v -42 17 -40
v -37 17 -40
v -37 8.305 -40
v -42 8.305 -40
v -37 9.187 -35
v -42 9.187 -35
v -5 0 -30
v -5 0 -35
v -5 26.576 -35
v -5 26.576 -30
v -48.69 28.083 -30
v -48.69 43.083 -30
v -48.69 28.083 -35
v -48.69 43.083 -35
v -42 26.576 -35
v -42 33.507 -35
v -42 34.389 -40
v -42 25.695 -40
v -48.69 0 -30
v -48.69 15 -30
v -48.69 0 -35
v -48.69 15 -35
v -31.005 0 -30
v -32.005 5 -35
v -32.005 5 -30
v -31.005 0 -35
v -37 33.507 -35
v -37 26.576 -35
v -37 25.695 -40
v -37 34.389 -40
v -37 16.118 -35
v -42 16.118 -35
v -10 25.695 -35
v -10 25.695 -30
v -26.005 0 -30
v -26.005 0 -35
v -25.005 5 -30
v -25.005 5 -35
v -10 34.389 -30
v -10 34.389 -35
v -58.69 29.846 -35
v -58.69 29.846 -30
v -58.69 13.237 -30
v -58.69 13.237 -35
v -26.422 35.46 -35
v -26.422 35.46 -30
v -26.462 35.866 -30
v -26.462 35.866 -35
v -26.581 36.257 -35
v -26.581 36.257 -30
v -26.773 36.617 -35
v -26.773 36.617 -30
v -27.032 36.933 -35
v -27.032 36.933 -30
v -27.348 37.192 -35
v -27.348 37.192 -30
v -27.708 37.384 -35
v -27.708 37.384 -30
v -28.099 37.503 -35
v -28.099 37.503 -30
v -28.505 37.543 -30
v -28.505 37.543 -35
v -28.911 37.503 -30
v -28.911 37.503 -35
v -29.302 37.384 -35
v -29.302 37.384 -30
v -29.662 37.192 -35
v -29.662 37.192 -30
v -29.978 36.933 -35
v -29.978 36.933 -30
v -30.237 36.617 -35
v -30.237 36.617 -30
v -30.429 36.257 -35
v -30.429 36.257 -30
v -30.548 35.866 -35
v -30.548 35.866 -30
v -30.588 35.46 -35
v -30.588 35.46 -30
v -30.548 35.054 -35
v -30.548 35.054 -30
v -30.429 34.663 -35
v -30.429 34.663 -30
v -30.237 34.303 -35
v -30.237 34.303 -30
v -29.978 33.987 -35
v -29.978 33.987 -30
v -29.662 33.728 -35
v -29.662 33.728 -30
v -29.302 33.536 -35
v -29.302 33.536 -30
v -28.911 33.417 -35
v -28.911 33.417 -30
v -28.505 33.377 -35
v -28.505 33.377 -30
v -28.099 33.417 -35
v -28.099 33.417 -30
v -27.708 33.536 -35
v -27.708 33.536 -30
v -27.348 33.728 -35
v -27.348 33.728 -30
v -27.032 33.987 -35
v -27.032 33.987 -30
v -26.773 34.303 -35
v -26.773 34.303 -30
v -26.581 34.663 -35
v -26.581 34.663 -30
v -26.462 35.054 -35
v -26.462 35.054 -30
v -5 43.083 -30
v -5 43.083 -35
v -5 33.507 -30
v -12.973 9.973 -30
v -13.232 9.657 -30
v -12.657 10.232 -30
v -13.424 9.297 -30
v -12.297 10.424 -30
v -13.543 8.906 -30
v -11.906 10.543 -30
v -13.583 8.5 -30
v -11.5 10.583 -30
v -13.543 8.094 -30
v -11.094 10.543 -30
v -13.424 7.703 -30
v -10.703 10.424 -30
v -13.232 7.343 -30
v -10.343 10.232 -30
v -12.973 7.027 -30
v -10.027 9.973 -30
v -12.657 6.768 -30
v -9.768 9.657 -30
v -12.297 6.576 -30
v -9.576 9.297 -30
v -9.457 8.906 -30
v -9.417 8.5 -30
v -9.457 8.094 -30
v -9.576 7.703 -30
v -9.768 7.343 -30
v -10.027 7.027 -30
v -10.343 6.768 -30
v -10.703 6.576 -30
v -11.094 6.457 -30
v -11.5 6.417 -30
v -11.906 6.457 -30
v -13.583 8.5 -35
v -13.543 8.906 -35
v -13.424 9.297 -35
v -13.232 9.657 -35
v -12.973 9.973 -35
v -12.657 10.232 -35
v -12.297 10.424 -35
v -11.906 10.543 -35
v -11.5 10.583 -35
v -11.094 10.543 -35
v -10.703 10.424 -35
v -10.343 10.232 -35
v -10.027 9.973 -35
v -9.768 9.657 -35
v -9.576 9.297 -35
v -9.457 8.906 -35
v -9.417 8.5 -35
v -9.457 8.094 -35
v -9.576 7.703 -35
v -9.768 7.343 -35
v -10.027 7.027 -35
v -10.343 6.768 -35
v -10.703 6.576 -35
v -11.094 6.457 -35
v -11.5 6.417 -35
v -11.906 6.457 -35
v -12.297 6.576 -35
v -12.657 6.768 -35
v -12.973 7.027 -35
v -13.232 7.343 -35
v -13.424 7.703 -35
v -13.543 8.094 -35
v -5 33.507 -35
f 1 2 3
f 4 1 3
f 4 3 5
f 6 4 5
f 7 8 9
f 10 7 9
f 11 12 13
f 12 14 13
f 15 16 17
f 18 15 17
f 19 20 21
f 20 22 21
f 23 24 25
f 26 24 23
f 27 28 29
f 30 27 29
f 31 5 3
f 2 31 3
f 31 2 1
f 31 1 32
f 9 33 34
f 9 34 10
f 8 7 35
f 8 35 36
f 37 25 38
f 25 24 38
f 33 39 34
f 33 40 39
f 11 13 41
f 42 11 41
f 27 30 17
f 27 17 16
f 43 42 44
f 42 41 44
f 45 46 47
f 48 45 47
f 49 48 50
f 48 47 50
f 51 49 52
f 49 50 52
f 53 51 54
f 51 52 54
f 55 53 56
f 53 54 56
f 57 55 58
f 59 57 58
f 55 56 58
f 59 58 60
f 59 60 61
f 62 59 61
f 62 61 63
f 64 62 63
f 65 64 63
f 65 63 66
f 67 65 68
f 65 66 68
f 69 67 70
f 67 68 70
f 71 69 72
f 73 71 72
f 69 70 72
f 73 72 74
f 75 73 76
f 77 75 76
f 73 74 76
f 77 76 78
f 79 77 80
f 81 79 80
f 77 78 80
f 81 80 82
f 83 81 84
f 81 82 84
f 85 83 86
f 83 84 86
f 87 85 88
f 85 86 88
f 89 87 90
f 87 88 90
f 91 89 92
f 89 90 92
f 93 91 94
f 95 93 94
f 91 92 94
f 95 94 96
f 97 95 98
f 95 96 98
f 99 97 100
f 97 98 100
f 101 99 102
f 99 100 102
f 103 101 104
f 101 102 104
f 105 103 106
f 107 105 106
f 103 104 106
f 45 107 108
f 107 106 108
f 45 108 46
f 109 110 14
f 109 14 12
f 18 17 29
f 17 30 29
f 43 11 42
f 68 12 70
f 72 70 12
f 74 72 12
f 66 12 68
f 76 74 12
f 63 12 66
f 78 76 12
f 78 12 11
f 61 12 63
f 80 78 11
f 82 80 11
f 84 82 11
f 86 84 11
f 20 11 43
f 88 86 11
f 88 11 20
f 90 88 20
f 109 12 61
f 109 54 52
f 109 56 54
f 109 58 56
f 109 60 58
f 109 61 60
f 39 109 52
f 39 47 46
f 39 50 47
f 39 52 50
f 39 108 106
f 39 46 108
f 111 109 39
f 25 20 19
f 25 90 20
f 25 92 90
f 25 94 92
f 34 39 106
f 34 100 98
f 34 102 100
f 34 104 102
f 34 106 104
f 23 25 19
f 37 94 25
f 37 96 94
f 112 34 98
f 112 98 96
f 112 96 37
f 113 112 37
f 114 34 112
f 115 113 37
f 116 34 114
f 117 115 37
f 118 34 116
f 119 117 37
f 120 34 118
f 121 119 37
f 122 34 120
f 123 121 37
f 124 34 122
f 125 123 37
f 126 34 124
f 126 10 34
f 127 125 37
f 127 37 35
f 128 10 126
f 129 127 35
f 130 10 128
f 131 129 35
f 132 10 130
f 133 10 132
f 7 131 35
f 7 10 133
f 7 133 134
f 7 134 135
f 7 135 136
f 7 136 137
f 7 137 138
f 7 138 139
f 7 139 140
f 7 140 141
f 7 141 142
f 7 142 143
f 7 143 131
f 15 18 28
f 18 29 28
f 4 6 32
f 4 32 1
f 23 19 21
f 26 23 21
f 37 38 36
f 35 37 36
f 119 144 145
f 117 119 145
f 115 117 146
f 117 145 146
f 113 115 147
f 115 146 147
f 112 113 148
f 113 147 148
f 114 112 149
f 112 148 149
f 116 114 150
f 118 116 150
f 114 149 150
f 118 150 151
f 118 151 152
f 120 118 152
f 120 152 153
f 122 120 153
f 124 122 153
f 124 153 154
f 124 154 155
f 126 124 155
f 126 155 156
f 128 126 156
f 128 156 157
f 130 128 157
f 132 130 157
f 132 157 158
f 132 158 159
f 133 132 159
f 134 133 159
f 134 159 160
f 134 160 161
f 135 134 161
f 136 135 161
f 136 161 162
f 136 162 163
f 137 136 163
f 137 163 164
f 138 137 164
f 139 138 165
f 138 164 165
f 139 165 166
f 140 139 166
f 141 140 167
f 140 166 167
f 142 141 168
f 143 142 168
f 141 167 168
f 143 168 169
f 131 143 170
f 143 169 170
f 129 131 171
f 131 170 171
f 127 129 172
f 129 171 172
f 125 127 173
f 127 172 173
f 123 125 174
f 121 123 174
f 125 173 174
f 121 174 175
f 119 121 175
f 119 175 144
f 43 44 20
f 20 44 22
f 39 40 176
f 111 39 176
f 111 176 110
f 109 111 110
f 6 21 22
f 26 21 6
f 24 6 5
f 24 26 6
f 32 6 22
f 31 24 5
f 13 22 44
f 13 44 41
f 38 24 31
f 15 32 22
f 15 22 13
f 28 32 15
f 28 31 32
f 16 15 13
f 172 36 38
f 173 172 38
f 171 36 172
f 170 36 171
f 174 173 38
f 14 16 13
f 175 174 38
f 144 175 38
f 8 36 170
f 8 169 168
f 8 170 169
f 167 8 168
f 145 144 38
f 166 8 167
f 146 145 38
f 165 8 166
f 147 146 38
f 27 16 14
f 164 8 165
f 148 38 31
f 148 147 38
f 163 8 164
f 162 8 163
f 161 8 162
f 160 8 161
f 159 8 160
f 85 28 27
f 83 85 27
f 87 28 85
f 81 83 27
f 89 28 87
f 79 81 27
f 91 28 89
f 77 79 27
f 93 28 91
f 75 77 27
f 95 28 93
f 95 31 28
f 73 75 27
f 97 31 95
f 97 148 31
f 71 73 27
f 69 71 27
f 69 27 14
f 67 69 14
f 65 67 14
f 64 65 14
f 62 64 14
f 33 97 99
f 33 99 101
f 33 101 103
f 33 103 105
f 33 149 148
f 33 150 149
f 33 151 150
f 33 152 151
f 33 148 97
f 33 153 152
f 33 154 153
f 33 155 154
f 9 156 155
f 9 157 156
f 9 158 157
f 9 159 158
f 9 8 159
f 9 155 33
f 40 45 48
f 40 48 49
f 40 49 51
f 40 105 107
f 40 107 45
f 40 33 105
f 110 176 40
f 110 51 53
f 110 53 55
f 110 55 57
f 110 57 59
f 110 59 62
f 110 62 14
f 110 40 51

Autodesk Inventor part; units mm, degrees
ref_plane "YZ Plane" through (0, 0, 0) normal (1, 0, 0) x (0, 1, 0)
ref_plane "XZ Plane" through (0, 0, 0) normal (0, 1, 0) x (-1, 0, 0)
ref_plane "XY Plane" through (0, 0, 0) normal (0, 0, 1) x (1, 0, 0)
sketch "Sketch1" plane through (0, 0, 0) normal (0, 1, 0) x (-1, 0, 0)
  line L0 (0, 0) -> (0, -35)
  line L1 (0, -35) -> (37, -35)
  line L2 (37, -35) -> (37, -55)
  line L3 (37, -55) -> (48, -55)
  line L4 (48, -55) -> (48, 0)
  line L5 (48, 0) -> (22, 0)
  line L6 (22, 0) -> (22, 0)
  line L7 (22, 0) -> (0, 0)
  dimension "d0" = 35
  dimension "d1" = 37
  dimension "d2" = 20
  dimension "d3" = 11
  dimension "d4" = 55
  dimension "d5" = 26
  dimension "d6" = 0
extrude "Extrusion1" add sketch "Sketch1" along normal blind 50
shell "Shell1" thickness 5 removed faces 3 at (-48, 16.6667, -36.6667) at (-19.6667, 0, -23.3333) at (-19.6667, 50, -23.3333)
sketch "Sketch2" plane through (0, 0, 0) normal (1, 0, 0) x (0, 0, -1)
  line L0 (5, 0) -> (30, 0) projected
  line L1 (5, 0) -> (19, 0)
  line L2 (19, 0) -> (19, 17)
  line L3 (19, 17) -> (5, 17)
  line L4 (5, 17) -> (5, 0)
  point P0 (0, 0)
  dimension "d10" = 17
  dimension "d11" = 0
  dimension "d12" = 11
extrude "Extrusion2" cut sketch "Sketch2" against normal blind 10
sketch "Sketch3" plane through (-48, 0, -55) normal (-1, 0, 0) x (0, 0, 1)
  line L0 (0, 0) -> (0, 50) projected
  line L1 (5, 50) -> (25, 50) projected
  line L2 (0, 0) -> (5, 0)
  line L3 (5, 0) -> (5, 50)
  line L4 (5, 50) -> (0, 50)
  line L5 (0, 50) -> (0, 0)
  point P0 (55, 0)
extrude "Extrusion3" add sketch "Sketch3" along normal blind 15
sketch "Sketch4" plane through (-48, 0, 0) normal (-1, 0, 0) x (0, 0, 1)
  line L0 (-5, 0) -> (0, 0) projected
  line L1 (-5, 0) -> (-5, 50) projected
  line L2 (0, 0) -> (-5, 0)
  line L3 (-5, 0) -> (-5, 50)
  line L4 (-5, 50) -> (0, 50)
  line L5 (0, 50) -> (0, 0)
  point P0 (0, 0)
extrude "Extrusion4" add sketch "Sketch4" along normal blind 15
sketch "Sketch5" plane through (0, 17, -5) normal (0, 0, -1) x (-1, 0, 0)
  circle A0 centre (11.5, -8.5) radius 2.0828
  line L0 (63, -17) -> (0, -17) projected
  line L1 (0, -17) -> (0, 0) projected
  dimension "d19" = 4.1656
  dimension "d20" = 8.5
  dimension "d21" = 11.5
extrude "Extrusion5" cut sketch "Sketch5" against normal blind 15
sketch "Sketch6" plane through (0, 17, -5) normal (0, 0, -1) x (-1, 0, 0)
  circle A0 centre (28.505, 18.46) radius 2.0828
  line L0 (63, -17) -> (0, -17) projected
  line L1 (5, 0) -> (5, 33) projected
  dimension "d24" = 4.1656
  dimension "d25" = 35.46
  dimension "d26" = 23.505
extrude "Extrusion6" cut sketch "Sketch6" against normal blind 15
sketch "Sketch7" plane through (0, 17, -5) normal (0, 0, -1) x (-1, 0, 0)
  circle A0 centre (58.5, 19) radius 2.0828
  line L0 (63, 33) -> (63, -17) projected
  line L1 (5, 33) -> (63, 33) projected
  point P0 (0, -17)
  dimension "d29" = 4.1656
  dimension "d30" = 4.5
  dimension "d31" = 14
extrude "Extrusion7" cut sketch "Sketch7" against normal blind 15
sketch "Sketch13" plane through (0, 0, -35) normal (0, 0, -1) x (-1, 0, 0)
  circle A0 centre (11.5, 8.5) radius 2.0828
  line L0 (0, 0) -> (37, 0) projected
  line L1 (0, 0) -> (0, 50) projected
  dimension "d41" = 4.1656
  dimension "d42" = 8.5
  dimension "d43" = 11.5
extrude "Extrusion9" cut sketch "Sketch13" against normal blind 15
sketch "Sketch14" plane through (-37, 0, -55) normal (0, 0, -1) x (-1, 0, 0)
  circle A0 centre (-8.495, 35.46) radius 2.0828
  line L0 (-37, 0) -> (-37, 50) projected
  line L1 (0, 0) -> (26, 0) projected
  dimension "d46" = 4.1656
  dimension "d47" = 28.505
  dimension "d48" = 35.46
extrude "Extrusion10" cut sketch "Sketch14" against normal blind 15
sketch "Sketch15" plane through (-37, 0, -55) normal (0, 0, -1) x (-1, 0, 0)
  circle A0 centre (21.5, 36) radius 2.0828
  line L0 (0, 0) -> (26, 0) projected
  line L1 (26, 50) -> (26, 0) projected
  point P0 (-37, 0)
  dimension "d51" = 4.1656
  dimension "d52" = 36
  dimension "d53" = 4.5
extrude "Extrusion11" cut sketch "Sketch15" against normal blind 15
sketch "Sketch16" plane through (-42, 0, -30) normal (-1, 0, 0) x (0, 0, 1)
  line L0 (0, 0) -> (-5, 0)
  line L1 (-5, 0) -> (-5, 50)
  line L2 (-5, 50) -> (0, 50)
  line L3 (0, 50) -> (0, 0)
  point P0 (30, 0)
  dimension "d56" = 5
  dimension "d57" = 50
extrude "Extrusion12" add sketch "Sketch16" along normal blind 21
sketch "Sketch17" plane through (-5, 0, -30) normal (0, 0, 1) x (1, 0, 0)
  circle A0 centre (-23.505, 35.46) radius 2.0828
  line L0 (0, 0) -> (0, 50) projected
  line L1 (0, 0) -> (-58, 0) projected
  point P0 (5, 0)
  dimension "d60" = 4.1656
  dimension "d61" = 23.505
  dimension "d62" = 35.46
extrude "Extrusion13" cut sketch "Sketch17" against normal blind 10
sketch "Sketch18" plane through (-42, 0, -35) normal (0, 0, -1) x (-1, 0, 0)
  circle A0 centre (16.5, 36) radius 2.0828
  line L0 (21, 50) -> (21, 0) projected
  line L1 (0, 0) -> (21, 0) projected
  point P0 (-42, 0)
  dimension "d65" = 4.1656
  dimension "d67" = 36
  dimension "d70" = 4.5
extrude "Extrusion14" cut sketch "Sketch18" against normal blind 10
sketch "Sketch20" plane through (-63, 0, 0) normal (-1, 0, 0) x (0, 0, 1)
  line L0 (0, 0) -> (-5, 0) projected
  line L1 (-5, 17) -> (-5, 50) projected
  line L2 (0, 0) -> (-5, 0)
  line L3 (-5, 0) -> (-5, 50)
  line L4 (-5, 50) -> (0, 50)
  line L5 (0, 50) -> (0, 0)
extrude "Extrusion15" add sketch "Sketch20" along normal blind 2.583
sketch "Sketch21" plane through (-63, 0, -30) normal (-1, 0, 0) x (0, 0, 1)
  line L0 (-20, 50) -> (-5, 50) projected
  line L1 (11, 0) -> (0, 0) projected
  line L2 (-5, 50) -> (0, 50)
  line L3 (0, 50) -> (0, 0)
  line L4 (0, 0) -> (-5, 0)
  line L5 (-5, 0) -> (-5, 50)
  point P0 (30, 0)
extrude "Extrusion16" add sketch "Sketch21" along normal blind 2.583
sketch "Sketch22" plane through (-63, 0, -55) normal (-1, 0, 0) x (0, 0, 1)
  line L0 (0, 0) -> (0, 50) projected
  line L1 (5, 0) -> (5, 50) projected
  line L2 (0, 50) -> (5, 50)
  line L3 (5, 50) -> (5, 0)
  line L4 (5, 0) -> (0, 0)
  line L5 (0, 0) -> (0, 50)
  point P0 (55, 0)
extrude "Extrusion17" add sketch "Sketch22" along normal blind 2.583
sketch "Sketch23" plane through (0, 0, 0) normal (0, 0, 1) x (1, 0, 0)
  line L0 (0, 50) -> (-37, 50) projected
  line L1 (-65.583, 50) -> (-65.583, 0) projected
  line L2 (0, 50) -> (-65.583, 50)
  line L3 (-65.583, 50) -> (-65.583, 43.083)
  line L4 (-65.583, 43.083) -> (0, 43.083)
  line L5 (0, 43.083) -> (0, 50)
  point P0 (0, 0)
  dimension "d77" = 6.917
extrude "Extrusion18" cut sketch "Sketch23" against normal blind 100
sketch "Sketch24" plane through (0, 0, -35) normal (0, 0, -1) x (-1, 0, 0)
  line L0 (0, 0) -> (65.583, 0) projected
  line L1 (31.0052, 0) -> (26.0052, 0)
  line L2 (26.0052, 5) -> (31.0052, 5)
  circle A0 centre (28.505, 35.46) radius 2.0828 projected
  line L3 (26.0052, 5) -> (25.0052, 5)
  line L4 (25.0052, 5) -> (26.0052, 0)
  line L5 (31.0052, 5) -> (32.0052, 5)
  line L6 (32.0052, 5) -> (31.0052, 0)
  dimension "d80" = 5
  dimension "d81" = 5
  dimension "d83" = 1
  dimension "d84" = 1
extrude "Extrusion19" cut sketch "Sketch24" against normal blind 100 contours L4 L3 L2 L5 L6 L0
sketch "Sketch25" plane through (-65.583, 0, -55) normal (-1, 0, 0) x (0, 0, 1)
  line L0 (20, 0) -> (0, 0) projected
  line L1 (0, 43.083) -> (20, 43.083) projected
  line L2 (0, 0) -> (5, 0)
  line L3 (5, 0) -> (5, 43.083)
  line L4 (5, 43.083) -> (0, 43.083)
  line L5 (0, 43.083) -> (0, 0)
  point P0 (55, 0)
  dimension "d87" = 5
extrude "Extrusion20" add sketch "Sketch25" along normal blind 22.5
sketch "Sketch28" plane through (-65.583, 0, -30) normal (-1, 0, 0) x (0, 0, 1)
  line L0 (0, 0) -> (-5, 0) projected
  line L1 (-5, 0) -> (-5, 43.083) projected
  line L2 (0, 0) -> (-5, 0)
  line L3 (-5, 0) -> (-5, 43.083)
  line L4 (-5, 43.083) -> (0, 43.083)
  line L5 (0, 43.083) -> (0, 0)
  point P0 (30, 0)
extrude "Extrusion23" add sketch "Sketch28" along normal blind 22.5
sketch "Sketch26" plane through (-37, 0, -55) normal (0, 0, -1) x (-1, 0, 0)
  circle A0 centre (45.232, 36.922) radius 2.0828
  line L0 (51.083, 43.083) -> (51.083, 0) projected
  line L1 (51.083, 43.083) -> (0, 43.083) projected
  point P0 (-37, 0)
  dimension "d90" = 4.1656
  dimension "d91" = 5.851
  dimension "d92" = 6.161
extrude "Extrusion21" cut sketch "Sketch26" against normal blind 25
sketch "Sketch27" plane through (-37, 0, -55) normal (0, 0, -1) x (-1, 0, 0)
  circle A0 centre (48.381, 15.906) radius 2.0828
  line L0 (51.083, 43.083) -> (51.083, 0) projected
  line L1 (0, 0) -> (51.083, 0) projected
  point P0 (-37, 0)
  dimension "d95" = 4.1656
  dimension "d96" = 2.702
  dimension "d97" = 15.906
extrude "Extrusion22" cut sketch "Sketch27" against normal blind 25
sketch "Sketch29" plane through (-42, 0, -35) normal (0, 0, -1) x (-1, 0, 0)
  circle A0 centre (43.381, 15.906) radius 2.0828 projected
  arc A1 (46.083, 19.6075) -> (46.083, 12.2045) centre (43.381, 15.906) ccw
  line L0 (46.083, 43.083) -> (46.083, 0) projected
  line L1 (46.083, 19.6075) -> (46.083, 12.2045)
  point P0 (-42, 0)
  dimension "d102" = 2.5
extrude "Extrusion24" add sketch "Sketch29" along normal up to next
sketch "Sketch30" plane through (-88.083, 0, -55) normal (-1, 0, 0) x (0, 0, 1)
  line L0 (9, 19.6075) -> (21, 19.6075)
  line L1 (21, 19.6075) -> (21, 5)
  line L2 (21, 5) -> (9, 5)
  line L3 (9, 5) -> (9, 19.6075)
  line L4 (0, 43.083) -> (0, 0) projected
  line L5 (25, 0) -> (25, 43.083) projected
  line L6 (0, 0) -> (5, 0) projected
  line L7 (20, 19.6075) -> (5, 19.6075) projected
  point P0 (55, 0)
  dimension "d105" = 9
  dimension "d106" = 4
  dimension "d107" = 5
  dimension "d108" = 0
extrude "Extrusion25" add sketch "Sketch30" along normal blind 30
sketch "Sketch31" plane through (-88.083, 5, -34) normal (0, 0, 1) x (1, 0, 0)
  circle A0 centre (-23.917, 4) radius 2.0828
  line L0 (-30, 0) -> (-30, 14.6075) projected
  line L1 (0, 0) -> (-30, 0) projected
  point P0 (88.083, -5)
  dimension "d111" = 4.1656
  dimension "d112" = 6.083
  dimension "d113" = 4
extrude "Extrusion26" cut sketch "Sketch31" against normal blind 30
sketch "Sketch33" plane through (-88.083, 5, -34) normal (0, 0, 1) x (1, 0, 0)
  circle A0 centre (-23.917, 4) radius 2.0828 projected
  arc A1 (-25.0228, 9.9816) -> (-30, 4) centre (-23.917, 4) ccw
  line L0 (-30, 14.6075) -> (-30, 0) projected
  line L1 (-30, 0) -> (-30, 14.6075) projected
  line L2 (0, 14.6075) -> (-30, 14.6075) projected
  line L3 (-30, 4) -> (-30, 14.6075)
  line L4 (0, 14.6075) -> (-30, 14.6075) projected
  line L5 (-30, 14.6075) -> (0, 14.6075)
  line L6 (0, 14.6075) -> (-25.0228, 9.9816)
  point P0 (88.083, -5)
extrude "Extrusion27" cut sketch "Sketch33" against normal blind 30 contours A1 L0 L2 L6
sketch "Sketch34" plane through (-118.083, 5, -34) normal (0, 0, 1) x (1, 0, 0)
  circle A0 centre (6.083, 4) radius 2.0828 projected
  line L0 (0, 0) -> (0, 4) projected
  arc A1 (0, 4) -> (1.5001, 0) centre (6.083, 4) ccw
  line L1 (30, 0) -> (0, 0) projected
  line L2 (1.5001, 0) -> (0, 0)
  arc A2 (4.9772, 9.9816) -> (0, 4) centre (6.083, 4) ccw projected
  line L3 (0, 0) -> (0, 4)
  point P0 (118.083, -5)
extrude "Extrusion28" cut sketch "Sketch34" against normal blind 30 contours L0 A1 L1
sketch "Sketch35" plane through (-88.083, 5, -46) normal (0, -1, 0) x (1, 0, 0)
  line L0 (0, 12) -> (0, 11) projected
  line L1 (0, 0) -> (-28.4999, 0) projected
  line L2 (0, 11) -> (0, 0)
  line L3 (0, 0) -> (7.2848, 11)
  line L4 (7.2848, 11) -> (7.2848, -4) projected
  line L5 (0, 11) -> (7.2848, 11)
  line L6 (46.083, 11) -> (0, 11) projected
  point P0 (88.083, 46)
extrude "Extrusion29" add sketch "Sketch35" against normal up to next
sketch "Sketch36" plane through (0, 0, 0) normal (1, 0, 0) x (0, 0, -1)
  line L0 (30, 43.083) -> (35, 43.083) projected
  line L1 (0, 0) -> (5, 0) projected
  line L2 (30, 43.083) -> (0, 43.083)
  line L3 (0, 43.083) -> (0, 0)
  line L4 (0, 0) -> (30, 0)
  line L5 (30, 0) -> (30, 43.083)
extrude "Extrusion30" cut sketch "Sketch36" against normal through all
sketch "Sketch37" plane through (0, 43.083, -35) normal (0, 0, -1) x (-1, 0, 0)
  line L0 (10, -8.694) -> (10, -17.3883)
  line L1 (10, -17.3883) -> (5, -16.5067)
  line L2 (10, -8.694) -> (5, -9.5756)
  line L3 (10, -8.694) -> (15.0771, -8.694) construction
  line L4 (5, -9.5756) -> (5, -16.5067)
  line L5 (0, -43.083) -> (0, 0) projected
  line L6 (0, -43.083) -> (26.0052, -43.083) projected
  dimension "d124" = 8.6943
  dimension "d125" = 80
  dimension "d126" = 170
  dimension "d127" = 5
  dimension "d130" = 5
  dimension "d131" = 34.389
extrude "Extrusion31" cut sketch "Sketch37" against normal blind 10
sketch "Sketch38" plane through (-37, 0, -35) normal (1, 0, 0) x (0, 0, -1)
  line L0 (20, 43.083) -> (20, 0) projected
  line L1 (0, 0) -> (20, 0)
  line L2 (20, 0) -> (20, 43.083)
  line L3 (20, 43.083) -> (0, 43.083)
  line L4 (0, 43.083) -> (0, 0)
  point P0 (-35, 0)
extrude "Extrusion32" cut sketch "Sketch38" against normal through all
sketch "Sketch39" plane through (0, 0, -30) normal (1, 0, 0) x (0, 0, -1)
  line L0 (10, 34.389) -> (10, 25.6947)
  line L1 (10, 25.6947) -> (5, 26.5763)
  line L2 (10, 34.389) -> (5, 33.5074)
  line L3 (10, 34.389) -> (15.0771, 34.389) construction
  line L4 (5, 33.5074) -> (5, 26.5763)
  line L5 (5, 0) -> (5, 43.083) projected
  point P0 (5, 33.5074)
  dimension "d136" = 8.6943
  dimension "d137" = 80
  dimension "d138" = 170
  dimension "d139" = 5
  dimension "d140" = 0
  dimension "d141" = 8.694
extrude "Extrusion33" add sketch "Sketch39" against normal blind 42
sketch "Sketch40" plane through (0, 0, -30) normal (1, 0, 0) x (0, 0, -1)
  line L0 (5, 38.0828) -> (5, 33.9172) projected
  line L1 (5, 36.5278) -> (10.9453, 36.5278)
  line L2 (10.9453, 36.5278) -> (10.9453, 22.5092)
  line L3 (10.9453, 22.5092) -> (5, 22.5092)
  line L4 (5, 22.5092) -> (5, 36.5278)
  point P0 (-30, 0)
extrude "Extrusion34" cut sketch "Sketch40" against normal blind 37
sketch "Sketch41" plane through (0, 0, -35) normal (0, 0, -1) x (-1, 0, 0)
  line L0 (0, 0) -> (5, 0)
  line L1 (5, 0) -> (5, 45.0451)
  line L2 (5, 45.0451) -> (0, 45.0451)
  line L3 (0, 45.0451) -> (0, 0)
  dimension "d146" = 5
extrude "Extrusion35" cut sketch "Sketch41" against normal blind 27
sketch "Sketch43" plane through (-37, 0, -30) normal (1, 0, 0) x (0, 0, -1)
  line L0 (10, 16.9997) -> (10, 8.3054)
  line L1 (10, 8.3054) -> (5, 9.187)
  line L2 (10, 16.9997) -> (5, 16.118)
  line L3 (10, 16.9997) -> (15.0771, 16.9997) construction
  line L4 (5, 16.118) -> (5, 9.187)
  line L5 (10, 34.389) -> (10, 25.6947) projected
  point P0 (5, 0)
  dimension "d149" = 8.6943
  dimension "d150" = 80
  dimension "d151" = 170
  dimension "d152" = 5
  dimension "d153" = 0
  dimension "d154" = 9.187
extrude "Extrusion36" add sketch "Sketch43" against normal blind 5
sketch "Sketch44" plane through (-25.0052, 5, -35) normal (0, 0, -1) x (-1, 0, 0)
  line L0 (23.6844, 38.083) -> (23.6844, 23.083)
  line L1 (23.6844, 23.083) -> (33.6844, 24.8463)
  line L2 (33.6844, 24.8463) -> (33.6844, 8.2367)
  line L3 (33.6844, 8.2367) -> (23.6844, 10)
  line L4 (23.6844, 10) -> (23.6844, -5)
  line L5 (6, -5) -> (63.0778, -5) projected
  line L6 (63.0778, 38.083) -> (-20.0052, 38.083) projected
  line L7 (23.6844, 38.083) -> (96.1703, 54.1884)
  line L8 (96.1703, 54.1884) -> (94.0332, -32.3639)
  line L9 (94.0332, -32.3639) -> (23.6844, -5)
  point P0 (-25.0052, -5)
  dimension "d157" = 15
  dimension "d158" = 15
  dimension "d159" = 13.083
  dimension "d160" = 80
  dimension "d161" = 80
  dimension "d162" = 10
extrude "Extrusion37" cut sketch "Sketch44" against normal through all
properties part number "Frame VG01-04"
